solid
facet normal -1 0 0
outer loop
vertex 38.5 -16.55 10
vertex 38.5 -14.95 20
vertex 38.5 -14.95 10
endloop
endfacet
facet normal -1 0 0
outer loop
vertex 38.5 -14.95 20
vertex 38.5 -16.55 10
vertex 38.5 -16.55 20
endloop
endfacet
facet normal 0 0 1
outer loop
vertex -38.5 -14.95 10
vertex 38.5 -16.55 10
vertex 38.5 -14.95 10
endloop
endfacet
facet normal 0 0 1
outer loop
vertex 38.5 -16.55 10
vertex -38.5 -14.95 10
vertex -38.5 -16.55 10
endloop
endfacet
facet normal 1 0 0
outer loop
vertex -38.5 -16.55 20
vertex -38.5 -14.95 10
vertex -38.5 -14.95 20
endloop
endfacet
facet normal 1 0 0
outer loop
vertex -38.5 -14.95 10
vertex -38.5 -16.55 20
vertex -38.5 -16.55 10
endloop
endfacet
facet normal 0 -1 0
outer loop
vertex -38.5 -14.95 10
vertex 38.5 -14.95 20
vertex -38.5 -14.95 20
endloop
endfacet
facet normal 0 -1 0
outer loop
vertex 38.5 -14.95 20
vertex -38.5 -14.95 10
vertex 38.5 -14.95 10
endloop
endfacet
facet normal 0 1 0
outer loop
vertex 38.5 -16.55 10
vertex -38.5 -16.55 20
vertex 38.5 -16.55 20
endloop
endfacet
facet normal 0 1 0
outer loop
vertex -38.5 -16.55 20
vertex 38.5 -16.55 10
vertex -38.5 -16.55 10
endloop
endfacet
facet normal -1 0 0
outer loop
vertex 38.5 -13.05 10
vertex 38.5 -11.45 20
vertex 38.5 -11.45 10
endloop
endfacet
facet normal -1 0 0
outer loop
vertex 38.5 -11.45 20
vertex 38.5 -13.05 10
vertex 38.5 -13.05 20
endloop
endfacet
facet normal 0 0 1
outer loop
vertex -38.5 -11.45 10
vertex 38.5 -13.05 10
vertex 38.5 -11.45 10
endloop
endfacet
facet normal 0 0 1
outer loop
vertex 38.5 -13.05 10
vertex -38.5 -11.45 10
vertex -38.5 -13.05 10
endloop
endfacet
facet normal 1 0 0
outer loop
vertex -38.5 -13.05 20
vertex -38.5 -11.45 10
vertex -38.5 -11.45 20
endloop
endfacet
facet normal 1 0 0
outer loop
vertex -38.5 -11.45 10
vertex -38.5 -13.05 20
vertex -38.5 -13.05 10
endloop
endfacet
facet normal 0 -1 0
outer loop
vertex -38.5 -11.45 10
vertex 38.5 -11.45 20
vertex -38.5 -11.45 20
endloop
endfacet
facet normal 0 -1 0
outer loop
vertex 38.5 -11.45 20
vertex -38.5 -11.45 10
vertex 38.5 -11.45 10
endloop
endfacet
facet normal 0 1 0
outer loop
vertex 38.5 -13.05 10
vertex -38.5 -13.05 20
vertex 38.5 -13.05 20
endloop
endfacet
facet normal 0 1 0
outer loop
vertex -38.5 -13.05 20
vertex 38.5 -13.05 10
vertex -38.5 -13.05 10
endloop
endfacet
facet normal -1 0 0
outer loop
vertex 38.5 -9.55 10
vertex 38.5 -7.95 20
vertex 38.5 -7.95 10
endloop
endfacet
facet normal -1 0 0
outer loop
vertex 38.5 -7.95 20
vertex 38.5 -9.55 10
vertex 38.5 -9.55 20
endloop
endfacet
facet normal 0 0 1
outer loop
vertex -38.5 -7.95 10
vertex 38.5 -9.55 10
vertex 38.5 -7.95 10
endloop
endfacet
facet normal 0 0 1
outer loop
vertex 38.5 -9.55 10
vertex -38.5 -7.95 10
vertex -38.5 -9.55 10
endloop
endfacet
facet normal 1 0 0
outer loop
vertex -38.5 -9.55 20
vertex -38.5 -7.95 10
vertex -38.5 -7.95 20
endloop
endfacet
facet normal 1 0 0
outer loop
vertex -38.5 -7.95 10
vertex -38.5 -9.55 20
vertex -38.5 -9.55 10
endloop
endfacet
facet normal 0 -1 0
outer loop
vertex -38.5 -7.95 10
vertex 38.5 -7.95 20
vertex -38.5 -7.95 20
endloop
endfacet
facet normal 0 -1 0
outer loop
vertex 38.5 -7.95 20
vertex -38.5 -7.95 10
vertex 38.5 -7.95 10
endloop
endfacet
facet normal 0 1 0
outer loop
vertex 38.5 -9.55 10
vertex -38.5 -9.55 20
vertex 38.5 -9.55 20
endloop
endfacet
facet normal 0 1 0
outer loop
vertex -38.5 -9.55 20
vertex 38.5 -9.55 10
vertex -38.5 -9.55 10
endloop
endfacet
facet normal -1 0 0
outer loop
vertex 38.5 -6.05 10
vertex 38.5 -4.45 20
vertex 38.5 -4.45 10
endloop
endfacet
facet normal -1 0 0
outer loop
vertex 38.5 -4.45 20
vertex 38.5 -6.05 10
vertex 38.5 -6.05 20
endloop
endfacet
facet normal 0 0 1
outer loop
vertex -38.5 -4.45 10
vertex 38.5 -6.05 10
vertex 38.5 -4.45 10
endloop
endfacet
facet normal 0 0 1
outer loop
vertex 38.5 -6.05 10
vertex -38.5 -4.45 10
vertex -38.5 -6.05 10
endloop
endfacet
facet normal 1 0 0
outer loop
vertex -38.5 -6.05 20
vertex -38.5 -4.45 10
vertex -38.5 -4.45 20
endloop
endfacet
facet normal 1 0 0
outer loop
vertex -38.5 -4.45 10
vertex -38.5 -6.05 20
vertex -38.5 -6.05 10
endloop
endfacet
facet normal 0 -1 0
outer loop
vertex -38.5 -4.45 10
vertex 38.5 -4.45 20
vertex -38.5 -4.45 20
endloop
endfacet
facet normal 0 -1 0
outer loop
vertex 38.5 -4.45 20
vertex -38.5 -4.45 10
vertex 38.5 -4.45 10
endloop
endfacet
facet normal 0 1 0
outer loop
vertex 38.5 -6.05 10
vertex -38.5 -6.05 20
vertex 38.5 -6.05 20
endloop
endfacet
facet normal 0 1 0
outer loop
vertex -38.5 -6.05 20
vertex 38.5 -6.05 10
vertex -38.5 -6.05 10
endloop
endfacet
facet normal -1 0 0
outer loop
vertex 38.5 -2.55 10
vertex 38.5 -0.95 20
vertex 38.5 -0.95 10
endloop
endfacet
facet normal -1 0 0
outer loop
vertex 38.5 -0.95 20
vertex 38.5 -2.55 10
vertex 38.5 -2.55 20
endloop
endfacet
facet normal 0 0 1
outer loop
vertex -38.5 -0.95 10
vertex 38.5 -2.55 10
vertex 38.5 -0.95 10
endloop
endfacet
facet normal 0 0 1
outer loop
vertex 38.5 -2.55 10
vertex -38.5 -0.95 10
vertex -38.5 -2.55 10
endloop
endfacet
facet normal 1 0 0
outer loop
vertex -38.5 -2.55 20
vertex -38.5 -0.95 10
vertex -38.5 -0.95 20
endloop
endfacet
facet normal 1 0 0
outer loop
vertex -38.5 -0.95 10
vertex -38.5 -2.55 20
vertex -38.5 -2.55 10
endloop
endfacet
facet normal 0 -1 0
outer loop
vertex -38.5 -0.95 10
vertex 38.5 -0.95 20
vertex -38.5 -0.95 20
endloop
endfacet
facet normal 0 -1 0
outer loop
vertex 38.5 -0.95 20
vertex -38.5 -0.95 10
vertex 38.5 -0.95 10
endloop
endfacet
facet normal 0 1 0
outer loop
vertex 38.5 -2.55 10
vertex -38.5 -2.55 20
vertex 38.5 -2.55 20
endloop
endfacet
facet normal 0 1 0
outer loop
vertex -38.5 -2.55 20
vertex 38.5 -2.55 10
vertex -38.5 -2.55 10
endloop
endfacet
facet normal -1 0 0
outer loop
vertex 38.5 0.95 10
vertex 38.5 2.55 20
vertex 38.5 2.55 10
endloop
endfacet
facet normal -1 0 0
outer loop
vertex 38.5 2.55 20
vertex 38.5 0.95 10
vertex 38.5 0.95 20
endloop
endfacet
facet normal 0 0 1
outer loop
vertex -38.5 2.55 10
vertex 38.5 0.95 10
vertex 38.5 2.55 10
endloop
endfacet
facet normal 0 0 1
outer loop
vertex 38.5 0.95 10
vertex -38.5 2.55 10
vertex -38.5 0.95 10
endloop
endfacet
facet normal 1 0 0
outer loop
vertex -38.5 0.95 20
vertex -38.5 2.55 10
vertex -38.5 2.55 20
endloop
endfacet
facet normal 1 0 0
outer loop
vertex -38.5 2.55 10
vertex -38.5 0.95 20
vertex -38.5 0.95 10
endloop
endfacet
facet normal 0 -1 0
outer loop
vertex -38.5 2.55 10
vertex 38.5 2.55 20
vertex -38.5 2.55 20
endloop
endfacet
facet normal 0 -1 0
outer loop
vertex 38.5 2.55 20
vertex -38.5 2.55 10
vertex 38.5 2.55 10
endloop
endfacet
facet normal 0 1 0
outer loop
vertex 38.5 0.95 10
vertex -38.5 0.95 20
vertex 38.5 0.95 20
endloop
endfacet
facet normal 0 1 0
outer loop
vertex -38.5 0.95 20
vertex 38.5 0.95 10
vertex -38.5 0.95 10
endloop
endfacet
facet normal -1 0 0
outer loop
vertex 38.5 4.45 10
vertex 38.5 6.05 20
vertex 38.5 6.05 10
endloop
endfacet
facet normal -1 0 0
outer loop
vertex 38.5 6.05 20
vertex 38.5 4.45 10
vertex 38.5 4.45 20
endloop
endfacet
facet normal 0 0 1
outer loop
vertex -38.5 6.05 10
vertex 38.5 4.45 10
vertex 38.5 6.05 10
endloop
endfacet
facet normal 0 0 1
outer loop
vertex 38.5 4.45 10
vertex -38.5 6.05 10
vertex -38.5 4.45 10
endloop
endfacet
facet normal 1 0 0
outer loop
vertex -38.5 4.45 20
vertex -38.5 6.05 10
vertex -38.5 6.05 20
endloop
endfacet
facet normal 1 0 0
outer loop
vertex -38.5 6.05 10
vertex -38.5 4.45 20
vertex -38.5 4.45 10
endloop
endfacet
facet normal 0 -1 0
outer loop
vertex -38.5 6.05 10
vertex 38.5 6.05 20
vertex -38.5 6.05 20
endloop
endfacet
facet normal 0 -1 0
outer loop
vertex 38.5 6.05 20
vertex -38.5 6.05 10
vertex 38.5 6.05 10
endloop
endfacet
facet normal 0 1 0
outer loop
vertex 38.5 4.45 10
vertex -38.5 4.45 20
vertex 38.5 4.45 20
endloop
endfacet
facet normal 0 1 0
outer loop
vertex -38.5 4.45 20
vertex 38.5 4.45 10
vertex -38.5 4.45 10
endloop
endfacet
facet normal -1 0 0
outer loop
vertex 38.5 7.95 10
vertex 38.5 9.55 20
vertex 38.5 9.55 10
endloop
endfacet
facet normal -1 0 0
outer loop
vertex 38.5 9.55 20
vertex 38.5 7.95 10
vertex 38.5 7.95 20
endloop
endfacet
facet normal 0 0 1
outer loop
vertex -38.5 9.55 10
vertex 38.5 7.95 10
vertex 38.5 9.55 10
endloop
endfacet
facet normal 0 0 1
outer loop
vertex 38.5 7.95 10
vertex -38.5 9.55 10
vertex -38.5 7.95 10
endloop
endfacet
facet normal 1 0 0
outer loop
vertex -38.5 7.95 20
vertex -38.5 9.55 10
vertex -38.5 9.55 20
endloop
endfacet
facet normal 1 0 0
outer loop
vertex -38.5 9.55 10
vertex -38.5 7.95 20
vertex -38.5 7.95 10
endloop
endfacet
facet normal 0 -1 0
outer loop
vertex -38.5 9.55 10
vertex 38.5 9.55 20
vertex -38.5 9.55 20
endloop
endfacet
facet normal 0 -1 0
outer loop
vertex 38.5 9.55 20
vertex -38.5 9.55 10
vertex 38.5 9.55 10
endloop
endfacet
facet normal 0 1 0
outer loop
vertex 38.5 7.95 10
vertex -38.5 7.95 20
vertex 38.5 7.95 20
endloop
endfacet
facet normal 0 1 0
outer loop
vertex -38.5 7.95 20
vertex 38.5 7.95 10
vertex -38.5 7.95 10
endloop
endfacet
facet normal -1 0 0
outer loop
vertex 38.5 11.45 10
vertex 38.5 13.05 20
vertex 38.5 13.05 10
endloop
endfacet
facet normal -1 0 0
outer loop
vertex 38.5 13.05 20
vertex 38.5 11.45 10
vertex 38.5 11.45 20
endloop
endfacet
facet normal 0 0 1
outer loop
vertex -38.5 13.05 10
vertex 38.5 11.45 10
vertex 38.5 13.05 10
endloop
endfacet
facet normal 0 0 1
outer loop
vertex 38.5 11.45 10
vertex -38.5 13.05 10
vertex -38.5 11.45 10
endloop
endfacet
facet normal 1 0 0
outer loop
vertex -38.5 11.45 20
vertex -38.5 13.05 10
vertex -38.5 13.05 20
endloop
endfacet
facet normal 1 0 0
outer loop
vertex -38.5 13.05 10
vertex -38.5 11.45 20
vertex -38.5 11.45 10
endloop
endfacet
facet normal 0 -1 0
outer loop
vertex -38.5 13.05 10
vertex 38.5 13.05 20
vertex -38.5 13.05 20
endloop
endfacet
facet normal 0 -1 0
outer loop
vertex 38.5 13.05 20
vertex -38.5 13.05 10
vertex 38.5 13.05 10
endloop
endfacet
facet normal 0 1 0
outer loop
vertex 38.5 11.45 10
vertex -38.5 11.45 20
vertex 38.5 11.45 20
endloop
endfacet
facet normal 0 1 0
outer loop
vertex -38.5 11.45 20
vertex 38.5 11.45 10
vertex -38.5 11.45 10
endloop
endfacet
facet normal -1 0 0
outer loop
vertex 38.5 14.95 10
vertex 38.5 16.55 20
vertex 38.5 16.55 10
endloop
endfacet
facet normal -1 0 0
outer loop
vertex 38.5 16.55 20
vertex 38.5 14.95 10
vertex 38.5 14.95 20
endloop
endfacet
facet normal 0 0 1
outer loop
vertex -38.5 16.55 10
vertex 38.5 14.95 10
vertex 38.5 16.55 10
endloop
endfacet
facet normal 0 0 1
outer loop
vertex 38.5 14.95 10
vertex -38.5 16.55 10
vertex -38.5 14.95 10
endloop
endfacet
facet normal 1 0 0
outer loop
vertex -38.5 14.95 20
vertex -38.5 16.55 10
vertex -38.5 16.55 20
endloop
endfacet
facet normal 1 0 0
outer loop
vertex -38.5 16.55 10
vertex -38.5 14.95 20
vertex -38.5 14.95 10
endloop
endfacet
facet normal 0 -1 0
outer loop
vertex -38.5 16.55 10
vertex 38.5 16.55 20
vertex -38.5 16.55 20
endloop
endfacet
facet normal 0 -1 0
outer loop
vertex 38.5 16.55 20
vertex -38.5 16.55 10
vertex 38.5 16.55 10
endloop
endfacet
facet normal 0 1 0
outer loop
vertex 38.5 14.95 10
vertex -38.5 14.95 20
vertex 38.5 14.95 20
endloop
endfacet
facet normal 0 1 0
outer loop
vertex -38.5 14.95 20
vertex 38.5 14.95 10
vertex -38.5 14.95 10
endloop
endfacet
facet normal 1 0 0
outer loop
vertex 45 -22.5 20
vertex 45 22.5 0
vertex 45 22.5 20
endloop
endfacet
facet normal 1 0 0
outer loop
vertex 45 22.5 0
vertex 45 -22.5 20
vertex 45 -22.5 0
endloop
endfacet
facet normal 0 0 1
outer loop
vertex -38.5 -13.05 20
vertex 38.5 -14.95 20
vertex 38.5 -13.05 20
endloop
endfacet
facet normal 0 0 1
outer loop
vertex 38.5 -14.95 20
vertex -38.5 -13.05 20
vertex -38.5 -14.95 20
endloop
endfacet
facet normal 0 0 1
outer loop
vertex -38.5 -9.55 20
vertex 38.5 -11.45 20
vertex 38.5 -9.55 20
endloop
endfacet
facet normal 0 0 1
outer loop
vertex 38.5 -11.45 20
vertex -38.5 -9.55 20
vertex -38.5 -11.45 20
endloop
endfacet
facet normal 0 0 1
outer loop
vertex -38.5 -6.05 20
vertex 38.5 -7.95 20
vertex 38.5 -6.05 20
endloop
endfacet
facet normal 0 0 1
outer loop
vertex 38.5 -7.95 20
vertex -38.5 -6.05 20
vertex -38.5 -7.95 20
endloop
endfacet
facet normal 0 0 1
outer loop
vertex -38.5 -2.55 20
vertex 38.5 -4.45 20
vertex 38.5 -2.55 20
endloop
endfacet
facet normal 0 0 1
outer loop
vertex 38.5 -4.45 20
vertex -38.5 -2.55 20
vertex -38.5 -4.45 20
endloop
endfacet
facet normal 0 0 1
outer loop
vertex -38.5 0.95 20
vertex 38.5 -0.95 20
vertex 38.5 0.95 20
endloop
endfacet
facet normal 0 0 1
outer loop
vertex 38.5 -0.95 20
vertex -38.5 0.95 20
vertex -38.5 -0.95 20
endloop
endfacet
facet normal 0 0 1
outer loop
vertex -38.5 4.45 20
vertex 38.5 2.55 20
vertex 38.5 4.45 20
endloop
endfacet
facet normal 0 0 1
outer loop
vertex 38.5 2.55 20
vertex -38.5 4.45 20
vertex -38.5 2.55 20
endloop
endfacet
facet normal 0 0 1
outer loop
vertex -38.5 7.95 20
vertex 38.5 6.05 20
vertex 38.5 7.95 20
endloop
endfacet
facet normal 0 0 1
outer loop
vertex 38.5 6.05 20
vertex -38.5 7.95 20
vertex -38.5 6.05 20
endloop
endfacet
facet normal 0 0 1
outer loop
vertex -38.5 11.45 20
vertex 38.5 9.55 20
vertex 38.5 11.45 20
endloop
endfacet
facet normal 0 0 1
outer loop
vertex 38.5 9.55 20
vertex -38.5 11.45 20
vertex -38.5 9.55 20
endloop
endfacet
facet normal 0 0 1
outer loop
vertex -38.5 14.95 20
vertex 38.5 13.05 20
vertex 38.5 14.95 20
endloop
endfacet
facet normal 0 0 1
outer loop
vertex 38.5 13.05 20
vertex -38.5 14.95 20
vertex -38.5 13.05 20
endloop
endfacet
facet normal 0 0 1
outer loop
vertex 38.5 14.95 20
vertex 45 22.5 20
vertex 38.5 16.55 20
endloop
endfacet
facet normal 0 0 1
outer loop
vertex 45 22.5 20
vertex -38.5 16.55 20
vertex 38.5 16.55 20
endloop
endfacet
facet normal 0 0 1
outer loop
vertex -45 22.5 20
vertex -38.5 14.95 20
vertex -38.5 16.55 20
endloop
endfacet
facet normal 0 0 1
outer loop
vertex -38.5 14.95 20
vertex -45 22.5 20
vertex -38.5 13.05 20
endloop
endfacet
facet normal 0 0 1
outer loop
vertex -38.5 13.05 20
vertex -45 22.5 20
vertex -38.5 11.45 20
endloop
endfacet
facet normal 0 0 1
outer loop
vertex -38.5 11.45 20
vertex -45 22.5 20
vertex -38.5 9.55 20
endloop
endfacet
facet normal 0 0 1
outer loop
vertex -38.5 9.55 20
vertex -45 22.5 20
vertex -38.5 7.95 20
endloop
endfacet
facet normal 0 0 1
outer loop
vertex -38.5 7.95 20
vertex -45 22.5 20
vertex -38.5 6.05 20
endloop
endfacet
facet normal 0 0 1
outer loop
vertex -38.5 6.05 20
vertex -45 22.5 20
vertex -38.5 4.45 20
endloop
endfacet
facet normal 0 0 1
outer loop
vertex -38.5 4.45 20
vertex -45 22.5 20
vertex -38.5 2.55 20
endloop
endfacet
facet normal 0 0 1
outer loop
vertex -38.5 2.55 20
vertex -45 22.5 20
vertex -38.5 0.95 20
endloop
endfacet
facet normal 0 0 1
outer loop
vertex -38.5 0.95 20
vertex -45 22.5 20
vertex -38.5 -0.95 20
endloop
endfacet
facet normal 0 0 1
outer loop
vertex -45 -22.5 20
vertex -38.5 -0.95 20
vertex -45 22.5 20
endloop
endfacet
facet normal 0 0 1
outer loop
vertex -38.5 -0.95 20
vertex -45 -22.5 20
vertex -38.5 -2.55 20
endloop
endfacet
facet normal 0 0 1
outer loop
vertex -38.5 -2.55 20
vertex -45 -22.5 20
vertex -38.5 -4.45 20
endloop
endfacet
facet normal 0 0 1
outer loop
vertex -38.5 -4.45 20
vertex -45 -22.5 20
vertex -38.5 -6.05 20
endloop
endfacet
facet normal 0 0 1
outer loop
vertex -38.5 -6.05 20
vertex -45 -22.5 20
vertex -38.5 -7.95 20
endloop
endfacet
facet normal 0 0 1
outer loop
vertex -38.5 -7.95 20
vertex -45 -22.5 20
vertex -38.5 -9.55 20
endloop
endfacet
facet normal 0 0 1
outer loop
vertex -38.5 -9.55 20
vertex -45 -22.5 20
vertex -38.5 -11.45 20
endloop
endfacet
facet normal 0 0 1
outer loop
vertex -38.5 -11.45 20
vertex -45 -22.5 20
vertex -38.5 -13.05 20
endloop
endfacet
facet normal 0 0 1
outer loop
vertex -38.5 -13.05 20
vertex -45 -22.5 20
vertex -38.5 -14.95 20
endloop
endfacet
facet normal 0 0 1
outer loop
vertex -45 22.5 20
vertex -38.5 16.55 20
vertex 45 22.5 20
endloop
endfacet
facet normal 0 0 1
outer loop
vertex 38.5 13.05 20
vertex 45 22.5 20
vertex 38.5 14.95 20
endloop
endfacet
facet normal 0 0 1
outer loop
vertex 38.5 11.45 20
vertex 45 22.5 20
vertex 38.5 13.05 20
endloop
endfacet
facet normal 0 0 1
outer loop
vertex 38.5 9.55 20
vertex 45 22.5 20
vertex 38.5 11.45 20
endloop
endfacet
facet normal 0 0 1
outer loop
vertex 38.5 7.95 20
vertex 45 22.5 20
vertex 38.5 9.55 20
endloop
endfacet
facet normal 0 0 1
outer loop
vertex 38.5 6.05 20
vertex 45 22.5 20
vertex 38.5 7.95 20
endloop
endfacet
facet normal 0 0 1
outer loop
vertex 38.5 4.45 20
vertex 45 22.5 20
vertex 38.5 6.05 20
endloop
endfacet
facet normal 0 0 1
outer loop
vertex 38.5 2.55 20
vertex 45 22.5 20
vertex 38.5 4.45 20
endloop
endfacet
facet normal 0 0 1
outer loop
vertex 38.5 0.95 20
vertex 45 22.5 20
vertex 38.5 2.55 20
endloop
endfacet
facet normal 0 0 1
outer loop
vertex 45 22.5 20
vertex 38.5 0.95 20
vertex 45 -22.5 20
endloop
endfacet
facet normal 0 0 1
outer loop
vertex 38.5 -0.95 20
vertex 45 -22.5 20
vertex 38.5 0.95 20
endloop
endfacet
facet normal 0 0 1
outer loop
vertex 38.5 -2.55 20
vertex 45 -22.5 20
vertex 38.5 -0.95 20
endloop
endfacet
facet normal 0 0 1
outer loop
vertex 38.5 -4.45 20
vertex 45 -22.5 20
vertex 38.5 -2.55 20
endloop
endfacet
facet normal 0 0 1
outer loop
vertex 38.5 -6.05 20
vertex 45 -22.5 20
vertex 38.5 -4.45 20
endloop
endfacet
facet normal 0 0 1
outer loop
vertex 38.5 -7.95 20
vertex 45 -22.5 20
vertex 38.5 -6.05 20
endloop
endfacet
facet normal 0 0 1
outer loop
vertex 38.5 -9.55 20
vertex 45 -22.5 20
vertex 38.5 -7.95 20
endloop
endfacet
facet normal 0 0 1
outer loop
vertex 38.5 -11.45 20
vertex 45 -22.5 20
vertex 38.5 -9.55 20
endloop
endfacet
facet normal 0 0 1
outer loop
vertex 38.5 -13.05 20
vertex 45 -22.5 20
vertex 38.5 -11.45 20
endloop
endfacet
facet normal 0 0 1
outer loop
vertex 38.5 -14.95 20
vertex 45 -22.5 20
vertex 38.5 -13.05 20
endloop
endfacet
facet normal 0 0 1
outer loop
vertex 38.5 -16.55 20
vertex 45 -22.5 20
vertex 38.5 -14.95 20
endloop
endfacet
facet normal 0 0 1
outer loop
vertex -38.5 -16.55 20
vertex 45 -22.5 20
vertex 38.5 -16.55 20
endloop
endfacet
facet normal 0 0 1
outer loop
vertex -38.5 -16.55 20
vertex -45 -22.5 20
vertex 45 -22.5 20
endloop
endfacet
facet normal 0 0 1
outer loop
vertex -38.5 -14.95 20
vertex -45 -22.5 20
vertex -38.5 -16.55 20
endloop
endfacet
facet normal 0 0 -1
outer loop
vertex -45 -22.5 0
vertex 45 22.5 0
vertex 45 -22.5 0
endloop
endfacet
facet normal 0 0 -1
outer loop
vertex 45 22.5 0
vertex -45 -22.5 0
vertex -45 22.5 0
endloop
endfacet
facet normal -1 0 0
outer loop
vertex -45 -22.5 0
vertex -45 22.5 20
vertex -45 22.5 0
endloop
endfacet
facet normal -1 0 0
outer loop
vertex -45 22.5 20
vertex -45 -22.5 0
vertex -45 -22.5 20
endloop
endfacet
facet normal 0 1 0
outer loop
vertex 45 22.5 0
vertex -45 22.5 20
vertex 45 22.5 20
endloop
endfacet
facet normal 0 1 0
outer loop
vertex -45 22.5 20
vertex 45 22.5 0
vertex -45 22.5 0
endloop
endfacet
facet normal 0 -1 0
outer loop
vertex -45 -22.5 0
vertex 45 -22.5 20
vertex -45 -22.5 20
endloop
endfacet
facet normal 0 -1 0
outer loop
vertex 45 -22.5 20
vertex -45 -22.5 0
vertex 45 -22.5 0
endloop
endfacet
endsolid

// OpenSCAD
// Microscope slide drying rack
// Print orientation: base block on XY plane, slots open upward (+Z)

// ---------------- Parameters ----------------
block_len     = 90;    // base block length along X (mm)
block_wid     = 45;    // base block width along Y (mm)
block_h       = 20;    // base block height along Z (mm)

slot_count    = 10;    // number of slide slots
slot_len      = 77;    // slot length along X (mm)
slot_w        = 1.6;   // slot width along Y (mm)
slot_depth    = 10;    // slot depth from top face (mm)
slot_pitch    = 3.5;   // centre-to-centre slot spacing along Y (mm)

eps           = 0.5;   // overshoot so cutters pass the top face

$fn = 64;

// ---------------- Model ----------------
difference() {
    // Base block, centred in X and Y, sitting on z = 0
    translate([-block_len/2, -block_wid/2, 0])
        cube([block_len, block_wid, block_h]);

    // Slot group, centred on the block in X and Y
    for (i = [0 : slot_count - 1]) {
        y_c = (i - (slot_count - 1)/2) * slot_pitch;
        translate([-slot_len/2, y_c - slot_w/2, block_h - slot_depth])
            cube([slot_len, slot_w, slot_depth + eps]);
    }
}
